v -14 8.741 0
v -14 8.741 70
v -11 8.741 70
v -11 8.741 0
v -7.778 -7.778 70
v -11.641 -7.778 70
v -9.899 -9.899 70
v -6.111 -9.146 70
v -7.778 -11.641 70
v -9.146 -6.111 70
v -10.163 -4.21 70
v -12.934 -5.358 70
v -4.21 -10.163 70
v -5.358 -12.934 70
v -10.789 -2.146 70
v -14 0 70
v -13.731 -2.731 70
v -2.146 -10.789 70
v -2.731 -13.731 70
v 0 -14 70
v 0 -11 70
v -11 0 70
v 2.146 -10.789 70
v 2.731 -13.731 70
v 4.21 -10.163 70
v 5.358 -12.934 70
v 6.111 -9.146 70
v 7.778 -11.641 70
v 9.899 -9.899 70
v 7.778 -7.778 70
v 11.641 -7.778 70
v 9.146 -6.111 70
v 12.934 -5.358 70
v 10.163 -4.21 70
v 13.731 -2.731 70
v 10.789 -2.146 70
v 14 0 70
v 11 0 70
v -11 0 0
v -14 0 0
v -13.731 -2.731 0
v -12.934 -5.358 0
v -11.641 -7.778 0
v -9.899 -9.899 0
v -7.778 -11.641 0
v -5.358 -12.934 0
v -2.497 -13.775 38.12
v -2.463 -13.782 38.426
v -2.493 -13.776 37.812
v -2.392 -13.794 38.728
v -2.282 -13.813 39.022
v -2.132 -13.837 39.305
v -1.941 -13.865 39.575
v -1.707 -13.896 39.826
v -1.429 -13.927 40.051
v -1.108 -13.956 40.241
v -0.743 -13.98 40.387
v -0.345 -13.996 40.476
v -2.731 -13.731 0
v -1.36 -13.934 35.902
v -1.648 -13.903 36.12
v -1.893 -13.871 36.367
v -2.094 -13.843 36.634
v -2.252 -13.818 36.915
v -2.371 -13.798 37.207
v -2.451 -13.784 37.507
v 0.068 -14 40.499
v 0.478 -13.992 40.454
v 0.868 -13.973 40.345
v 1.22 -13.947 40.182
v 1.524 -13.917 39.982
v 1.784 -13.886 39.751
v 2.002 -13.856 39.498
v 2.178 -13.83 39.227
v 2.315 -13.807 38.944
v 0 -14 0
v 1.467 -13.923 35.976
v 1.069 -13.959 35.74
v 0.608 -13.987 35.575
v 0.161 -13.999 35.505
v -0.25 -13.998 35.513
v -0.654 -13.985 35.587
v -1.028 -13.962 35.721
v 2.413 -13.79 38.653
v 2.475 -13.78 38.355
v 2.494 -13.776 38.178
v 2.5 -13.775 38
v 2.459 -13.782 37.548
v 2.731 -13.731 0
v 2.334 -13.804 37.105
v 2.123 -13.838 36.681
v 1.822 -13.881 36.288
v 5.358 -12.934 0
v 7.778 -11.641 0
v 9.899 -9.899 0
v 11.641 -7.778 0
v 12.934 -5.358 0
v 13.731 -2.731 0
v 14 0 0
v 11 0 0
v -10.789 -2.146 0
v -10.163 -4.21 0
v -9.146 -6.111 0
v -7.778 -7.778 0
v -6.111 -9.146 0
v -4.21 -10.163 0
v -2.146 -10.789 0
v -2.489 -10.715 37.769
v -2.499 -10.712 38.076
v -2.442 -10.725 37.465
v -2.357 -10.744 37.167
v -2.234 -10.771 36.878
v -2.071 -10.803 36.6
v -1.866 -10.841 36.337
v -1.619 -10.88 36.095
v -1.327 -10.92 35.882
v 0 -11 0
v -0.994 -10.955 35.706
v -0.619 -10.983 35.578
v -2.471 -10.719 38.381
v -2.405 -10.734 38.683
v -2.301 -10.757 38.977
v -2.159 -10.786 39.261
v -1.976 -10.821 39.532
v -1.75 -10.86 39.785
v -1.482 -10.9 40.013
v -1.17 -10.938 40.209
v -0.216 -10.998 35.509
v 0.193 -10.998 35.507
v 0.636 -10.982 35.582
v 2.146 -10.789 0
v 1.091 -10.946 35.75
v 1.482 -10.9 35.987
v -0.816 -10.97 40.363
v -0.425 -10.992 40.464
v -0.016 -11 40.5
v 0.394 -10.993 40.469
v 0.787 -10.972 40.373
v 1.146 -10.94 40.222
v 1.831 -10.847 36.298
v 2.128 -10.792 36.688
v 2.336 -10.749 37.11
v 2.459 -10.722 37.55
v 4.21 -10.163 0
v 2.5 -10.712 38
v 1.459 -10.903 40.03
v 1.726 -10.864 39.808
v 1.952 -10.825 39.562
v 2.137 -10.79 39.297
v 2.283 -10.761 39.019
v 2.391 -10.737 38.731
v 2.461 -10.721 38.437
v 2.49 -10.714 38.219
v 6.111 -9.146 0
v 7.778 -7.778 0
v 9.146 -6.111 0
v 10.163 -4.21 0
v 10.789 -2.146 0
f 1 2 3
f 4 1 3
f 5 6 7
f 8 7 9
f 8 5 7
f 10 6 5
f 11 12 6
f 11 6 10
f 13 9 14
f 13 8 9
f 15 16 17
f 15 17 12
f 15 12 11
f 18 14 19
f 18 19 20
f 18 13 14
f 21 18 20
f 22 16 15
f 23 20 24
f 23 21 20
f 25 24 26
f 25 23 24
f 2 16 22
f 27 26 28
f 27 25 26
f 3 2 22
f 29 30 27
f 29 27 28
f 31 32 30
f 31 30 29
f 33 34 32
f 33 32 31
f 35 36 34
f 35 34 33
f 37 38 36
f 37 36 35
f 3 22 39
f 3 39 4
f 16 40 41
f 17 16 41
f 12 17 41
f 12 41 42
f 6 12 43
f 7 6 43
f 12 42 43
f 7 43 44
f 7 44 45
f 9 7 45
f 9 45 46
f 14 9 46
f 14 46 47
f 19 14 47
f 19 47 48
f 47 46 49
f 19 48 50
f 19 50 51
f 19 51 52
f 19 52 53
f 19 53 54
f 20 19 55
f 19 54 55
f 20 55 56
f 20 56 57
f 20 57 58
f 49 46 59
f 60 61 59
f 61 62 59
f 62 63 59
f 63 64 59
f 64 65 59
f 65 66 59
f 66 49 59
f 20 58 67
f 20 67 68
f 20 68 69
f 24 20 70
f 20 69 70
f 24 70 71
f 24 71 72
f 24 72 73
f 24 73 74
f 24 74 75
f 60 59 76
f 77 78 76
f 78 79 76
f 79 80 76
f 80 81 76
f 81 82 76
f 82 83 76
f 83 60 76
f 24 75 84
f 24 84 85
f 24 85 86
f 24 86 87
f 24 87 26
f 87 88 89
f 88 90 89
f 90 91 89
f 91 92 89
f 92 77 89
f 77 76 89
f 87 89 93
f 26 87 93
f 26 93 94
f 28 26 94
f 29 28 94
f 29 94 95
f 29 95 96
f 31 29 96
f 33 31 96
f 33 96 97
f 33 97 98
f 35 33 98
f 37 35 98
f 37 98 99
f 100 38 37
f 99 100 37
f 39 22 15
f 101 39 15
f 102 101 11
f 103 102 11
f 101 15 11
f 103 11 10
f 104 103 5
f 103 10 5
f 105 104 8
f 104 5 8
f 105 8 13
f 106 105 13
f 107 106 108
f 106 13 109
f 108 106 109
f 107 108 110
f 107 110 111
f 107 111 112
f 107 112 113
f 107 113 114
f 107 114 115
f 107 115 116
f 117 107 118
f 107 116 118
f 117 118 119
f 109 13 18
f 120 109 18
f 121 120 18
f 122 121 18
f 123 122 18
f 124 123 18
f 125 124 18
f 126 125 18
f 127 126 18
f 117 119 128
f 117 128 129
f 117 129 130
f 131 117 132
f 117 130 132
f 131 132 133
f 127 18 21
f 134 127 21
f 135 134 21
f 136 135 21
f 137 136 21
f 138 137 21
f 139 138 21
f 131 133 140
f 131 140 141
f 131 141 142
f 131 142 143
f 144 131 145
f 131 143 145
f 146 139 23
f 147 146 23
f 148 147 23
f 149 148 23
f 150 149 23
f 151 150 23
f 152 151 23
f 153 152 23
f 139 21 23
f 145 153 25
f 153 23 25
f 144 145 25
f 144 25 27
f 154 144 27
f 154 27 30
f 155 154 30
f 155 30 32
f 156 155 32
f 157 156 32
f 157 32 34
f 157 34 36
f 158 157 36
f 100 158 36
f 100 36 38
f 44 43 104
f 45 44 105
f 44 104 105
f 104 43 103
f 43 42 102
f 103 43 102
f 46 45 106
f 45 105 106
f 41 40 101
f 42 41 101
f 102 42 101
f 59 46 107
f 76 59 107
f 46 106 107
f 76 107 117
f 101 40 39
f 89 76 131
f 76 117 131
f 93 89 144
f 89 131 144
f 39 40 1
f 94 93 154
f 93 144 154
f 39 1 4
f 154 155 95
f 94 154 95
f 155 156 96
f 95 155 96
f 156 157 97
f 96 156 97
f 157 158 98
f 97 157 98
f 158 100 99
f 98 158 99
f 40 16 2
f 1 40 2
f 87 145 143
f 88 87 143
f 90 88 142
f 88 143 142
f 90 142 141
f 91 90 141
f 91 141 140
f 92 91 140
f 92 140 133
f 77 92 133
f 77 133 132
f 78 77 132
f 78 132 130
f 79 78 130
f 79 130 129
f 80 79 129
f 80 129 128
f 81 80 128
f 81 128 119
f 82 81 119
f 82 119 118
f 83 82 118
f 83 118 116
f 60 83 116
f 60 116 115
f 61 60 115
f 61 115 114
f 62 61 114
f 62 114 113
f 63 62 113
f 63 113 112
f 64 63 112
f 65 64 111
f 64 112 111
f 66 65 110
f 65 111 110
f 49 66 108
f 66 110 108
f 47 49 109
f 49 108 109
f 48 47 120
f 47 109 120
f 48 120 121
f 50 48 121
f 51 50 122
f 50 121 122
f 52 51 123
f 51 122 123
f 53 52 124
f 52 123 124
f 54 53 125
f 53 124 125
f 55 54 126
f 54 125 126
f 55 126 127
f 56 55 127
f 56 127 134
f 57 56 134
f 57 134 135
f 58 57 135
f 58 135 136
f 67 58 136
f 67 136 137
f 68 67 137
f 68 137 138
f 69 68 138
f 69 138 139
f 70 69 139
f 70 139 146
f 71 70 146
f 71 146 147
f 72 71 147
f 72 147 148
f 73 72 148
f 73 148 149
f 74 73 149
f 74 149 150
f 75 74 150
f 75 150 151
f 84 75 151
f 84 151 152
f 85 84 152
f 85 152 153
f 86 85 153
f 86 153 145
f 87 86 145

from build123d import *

# Parameters (mm, degrees)
SKETCH2_R           = 14
BOSS_EXTRUDE1_DEPTH = 70
SKETCH3_R           = 11
CUT_EXTRUDE1_DEPTH  = 71
SKETCH4_W           = 32.230614228
SKETCH4_H           = 15.278665706
CUT_EXTRUDE2_DEPTH  = 71
SKETCH5_W           = 3
SKETCH5_H           = 8.740769075
BOSS_EXTRUDE3_DEPTH = 70
SKETCH7_R           = 2.5
CUT_EXTRUDE3_DEPTH  = 15


with BuildPart() as part:
    # Sketch2 → Boss-Extrude1 (new body)
    with BuildSketch(Plane.XY):
        Circle(SKETCH2_R)
    extrude(amount=BOSS_EXTRUDE1_DEPTH)

    # Sketch3 → Cut-Extrude1 (cut, through all)
    with BuildSketch(Plane.XY.offset(70)):
        Circle(SKETCH3_R)
    extrude(amount=-CUT_EXTRUDE1_DEPTH, mode=Mode.SUBTRACT)

    # Sketch4 → Cut-Extrude2 (cut, through all)
    with BuildSketch(Plane.XY.offset(70)):
        with Locations((0.085938844, 7.639332853)):
            Rectangle(SKETCH4_W, SKETCH4_H)
    extrude(amount=-CUT_EXTRUDE2_DEPTH, mode=Mode.SUBTRACT)

    # Sketch5 → Boss-Extrude3 (add)
    with BuildSketch(Plane.XY.offset(70)):
        with Locations((-12.5, 4.370384538)):
            Rectangle(SKETCH5_W, SKETCH5_H)
    extrude(amount=-BOSS_EXTRUDE3_DEPTH)

    # Sketch7 → Cut-Extrude3 (cut, through all)
    with BuildSketch(Plane(origin=(0, 0, 0), x_dir=(1, 0, 0), z_dir=(0, 1, 0))):
        with Locations((0, -38)):
            Circle(SKETCH7_R)
    extrude(amount=-CUT_EXTRUDE3_DEPTH, mode=Mode.SUBTRACT)


solid = part.part
